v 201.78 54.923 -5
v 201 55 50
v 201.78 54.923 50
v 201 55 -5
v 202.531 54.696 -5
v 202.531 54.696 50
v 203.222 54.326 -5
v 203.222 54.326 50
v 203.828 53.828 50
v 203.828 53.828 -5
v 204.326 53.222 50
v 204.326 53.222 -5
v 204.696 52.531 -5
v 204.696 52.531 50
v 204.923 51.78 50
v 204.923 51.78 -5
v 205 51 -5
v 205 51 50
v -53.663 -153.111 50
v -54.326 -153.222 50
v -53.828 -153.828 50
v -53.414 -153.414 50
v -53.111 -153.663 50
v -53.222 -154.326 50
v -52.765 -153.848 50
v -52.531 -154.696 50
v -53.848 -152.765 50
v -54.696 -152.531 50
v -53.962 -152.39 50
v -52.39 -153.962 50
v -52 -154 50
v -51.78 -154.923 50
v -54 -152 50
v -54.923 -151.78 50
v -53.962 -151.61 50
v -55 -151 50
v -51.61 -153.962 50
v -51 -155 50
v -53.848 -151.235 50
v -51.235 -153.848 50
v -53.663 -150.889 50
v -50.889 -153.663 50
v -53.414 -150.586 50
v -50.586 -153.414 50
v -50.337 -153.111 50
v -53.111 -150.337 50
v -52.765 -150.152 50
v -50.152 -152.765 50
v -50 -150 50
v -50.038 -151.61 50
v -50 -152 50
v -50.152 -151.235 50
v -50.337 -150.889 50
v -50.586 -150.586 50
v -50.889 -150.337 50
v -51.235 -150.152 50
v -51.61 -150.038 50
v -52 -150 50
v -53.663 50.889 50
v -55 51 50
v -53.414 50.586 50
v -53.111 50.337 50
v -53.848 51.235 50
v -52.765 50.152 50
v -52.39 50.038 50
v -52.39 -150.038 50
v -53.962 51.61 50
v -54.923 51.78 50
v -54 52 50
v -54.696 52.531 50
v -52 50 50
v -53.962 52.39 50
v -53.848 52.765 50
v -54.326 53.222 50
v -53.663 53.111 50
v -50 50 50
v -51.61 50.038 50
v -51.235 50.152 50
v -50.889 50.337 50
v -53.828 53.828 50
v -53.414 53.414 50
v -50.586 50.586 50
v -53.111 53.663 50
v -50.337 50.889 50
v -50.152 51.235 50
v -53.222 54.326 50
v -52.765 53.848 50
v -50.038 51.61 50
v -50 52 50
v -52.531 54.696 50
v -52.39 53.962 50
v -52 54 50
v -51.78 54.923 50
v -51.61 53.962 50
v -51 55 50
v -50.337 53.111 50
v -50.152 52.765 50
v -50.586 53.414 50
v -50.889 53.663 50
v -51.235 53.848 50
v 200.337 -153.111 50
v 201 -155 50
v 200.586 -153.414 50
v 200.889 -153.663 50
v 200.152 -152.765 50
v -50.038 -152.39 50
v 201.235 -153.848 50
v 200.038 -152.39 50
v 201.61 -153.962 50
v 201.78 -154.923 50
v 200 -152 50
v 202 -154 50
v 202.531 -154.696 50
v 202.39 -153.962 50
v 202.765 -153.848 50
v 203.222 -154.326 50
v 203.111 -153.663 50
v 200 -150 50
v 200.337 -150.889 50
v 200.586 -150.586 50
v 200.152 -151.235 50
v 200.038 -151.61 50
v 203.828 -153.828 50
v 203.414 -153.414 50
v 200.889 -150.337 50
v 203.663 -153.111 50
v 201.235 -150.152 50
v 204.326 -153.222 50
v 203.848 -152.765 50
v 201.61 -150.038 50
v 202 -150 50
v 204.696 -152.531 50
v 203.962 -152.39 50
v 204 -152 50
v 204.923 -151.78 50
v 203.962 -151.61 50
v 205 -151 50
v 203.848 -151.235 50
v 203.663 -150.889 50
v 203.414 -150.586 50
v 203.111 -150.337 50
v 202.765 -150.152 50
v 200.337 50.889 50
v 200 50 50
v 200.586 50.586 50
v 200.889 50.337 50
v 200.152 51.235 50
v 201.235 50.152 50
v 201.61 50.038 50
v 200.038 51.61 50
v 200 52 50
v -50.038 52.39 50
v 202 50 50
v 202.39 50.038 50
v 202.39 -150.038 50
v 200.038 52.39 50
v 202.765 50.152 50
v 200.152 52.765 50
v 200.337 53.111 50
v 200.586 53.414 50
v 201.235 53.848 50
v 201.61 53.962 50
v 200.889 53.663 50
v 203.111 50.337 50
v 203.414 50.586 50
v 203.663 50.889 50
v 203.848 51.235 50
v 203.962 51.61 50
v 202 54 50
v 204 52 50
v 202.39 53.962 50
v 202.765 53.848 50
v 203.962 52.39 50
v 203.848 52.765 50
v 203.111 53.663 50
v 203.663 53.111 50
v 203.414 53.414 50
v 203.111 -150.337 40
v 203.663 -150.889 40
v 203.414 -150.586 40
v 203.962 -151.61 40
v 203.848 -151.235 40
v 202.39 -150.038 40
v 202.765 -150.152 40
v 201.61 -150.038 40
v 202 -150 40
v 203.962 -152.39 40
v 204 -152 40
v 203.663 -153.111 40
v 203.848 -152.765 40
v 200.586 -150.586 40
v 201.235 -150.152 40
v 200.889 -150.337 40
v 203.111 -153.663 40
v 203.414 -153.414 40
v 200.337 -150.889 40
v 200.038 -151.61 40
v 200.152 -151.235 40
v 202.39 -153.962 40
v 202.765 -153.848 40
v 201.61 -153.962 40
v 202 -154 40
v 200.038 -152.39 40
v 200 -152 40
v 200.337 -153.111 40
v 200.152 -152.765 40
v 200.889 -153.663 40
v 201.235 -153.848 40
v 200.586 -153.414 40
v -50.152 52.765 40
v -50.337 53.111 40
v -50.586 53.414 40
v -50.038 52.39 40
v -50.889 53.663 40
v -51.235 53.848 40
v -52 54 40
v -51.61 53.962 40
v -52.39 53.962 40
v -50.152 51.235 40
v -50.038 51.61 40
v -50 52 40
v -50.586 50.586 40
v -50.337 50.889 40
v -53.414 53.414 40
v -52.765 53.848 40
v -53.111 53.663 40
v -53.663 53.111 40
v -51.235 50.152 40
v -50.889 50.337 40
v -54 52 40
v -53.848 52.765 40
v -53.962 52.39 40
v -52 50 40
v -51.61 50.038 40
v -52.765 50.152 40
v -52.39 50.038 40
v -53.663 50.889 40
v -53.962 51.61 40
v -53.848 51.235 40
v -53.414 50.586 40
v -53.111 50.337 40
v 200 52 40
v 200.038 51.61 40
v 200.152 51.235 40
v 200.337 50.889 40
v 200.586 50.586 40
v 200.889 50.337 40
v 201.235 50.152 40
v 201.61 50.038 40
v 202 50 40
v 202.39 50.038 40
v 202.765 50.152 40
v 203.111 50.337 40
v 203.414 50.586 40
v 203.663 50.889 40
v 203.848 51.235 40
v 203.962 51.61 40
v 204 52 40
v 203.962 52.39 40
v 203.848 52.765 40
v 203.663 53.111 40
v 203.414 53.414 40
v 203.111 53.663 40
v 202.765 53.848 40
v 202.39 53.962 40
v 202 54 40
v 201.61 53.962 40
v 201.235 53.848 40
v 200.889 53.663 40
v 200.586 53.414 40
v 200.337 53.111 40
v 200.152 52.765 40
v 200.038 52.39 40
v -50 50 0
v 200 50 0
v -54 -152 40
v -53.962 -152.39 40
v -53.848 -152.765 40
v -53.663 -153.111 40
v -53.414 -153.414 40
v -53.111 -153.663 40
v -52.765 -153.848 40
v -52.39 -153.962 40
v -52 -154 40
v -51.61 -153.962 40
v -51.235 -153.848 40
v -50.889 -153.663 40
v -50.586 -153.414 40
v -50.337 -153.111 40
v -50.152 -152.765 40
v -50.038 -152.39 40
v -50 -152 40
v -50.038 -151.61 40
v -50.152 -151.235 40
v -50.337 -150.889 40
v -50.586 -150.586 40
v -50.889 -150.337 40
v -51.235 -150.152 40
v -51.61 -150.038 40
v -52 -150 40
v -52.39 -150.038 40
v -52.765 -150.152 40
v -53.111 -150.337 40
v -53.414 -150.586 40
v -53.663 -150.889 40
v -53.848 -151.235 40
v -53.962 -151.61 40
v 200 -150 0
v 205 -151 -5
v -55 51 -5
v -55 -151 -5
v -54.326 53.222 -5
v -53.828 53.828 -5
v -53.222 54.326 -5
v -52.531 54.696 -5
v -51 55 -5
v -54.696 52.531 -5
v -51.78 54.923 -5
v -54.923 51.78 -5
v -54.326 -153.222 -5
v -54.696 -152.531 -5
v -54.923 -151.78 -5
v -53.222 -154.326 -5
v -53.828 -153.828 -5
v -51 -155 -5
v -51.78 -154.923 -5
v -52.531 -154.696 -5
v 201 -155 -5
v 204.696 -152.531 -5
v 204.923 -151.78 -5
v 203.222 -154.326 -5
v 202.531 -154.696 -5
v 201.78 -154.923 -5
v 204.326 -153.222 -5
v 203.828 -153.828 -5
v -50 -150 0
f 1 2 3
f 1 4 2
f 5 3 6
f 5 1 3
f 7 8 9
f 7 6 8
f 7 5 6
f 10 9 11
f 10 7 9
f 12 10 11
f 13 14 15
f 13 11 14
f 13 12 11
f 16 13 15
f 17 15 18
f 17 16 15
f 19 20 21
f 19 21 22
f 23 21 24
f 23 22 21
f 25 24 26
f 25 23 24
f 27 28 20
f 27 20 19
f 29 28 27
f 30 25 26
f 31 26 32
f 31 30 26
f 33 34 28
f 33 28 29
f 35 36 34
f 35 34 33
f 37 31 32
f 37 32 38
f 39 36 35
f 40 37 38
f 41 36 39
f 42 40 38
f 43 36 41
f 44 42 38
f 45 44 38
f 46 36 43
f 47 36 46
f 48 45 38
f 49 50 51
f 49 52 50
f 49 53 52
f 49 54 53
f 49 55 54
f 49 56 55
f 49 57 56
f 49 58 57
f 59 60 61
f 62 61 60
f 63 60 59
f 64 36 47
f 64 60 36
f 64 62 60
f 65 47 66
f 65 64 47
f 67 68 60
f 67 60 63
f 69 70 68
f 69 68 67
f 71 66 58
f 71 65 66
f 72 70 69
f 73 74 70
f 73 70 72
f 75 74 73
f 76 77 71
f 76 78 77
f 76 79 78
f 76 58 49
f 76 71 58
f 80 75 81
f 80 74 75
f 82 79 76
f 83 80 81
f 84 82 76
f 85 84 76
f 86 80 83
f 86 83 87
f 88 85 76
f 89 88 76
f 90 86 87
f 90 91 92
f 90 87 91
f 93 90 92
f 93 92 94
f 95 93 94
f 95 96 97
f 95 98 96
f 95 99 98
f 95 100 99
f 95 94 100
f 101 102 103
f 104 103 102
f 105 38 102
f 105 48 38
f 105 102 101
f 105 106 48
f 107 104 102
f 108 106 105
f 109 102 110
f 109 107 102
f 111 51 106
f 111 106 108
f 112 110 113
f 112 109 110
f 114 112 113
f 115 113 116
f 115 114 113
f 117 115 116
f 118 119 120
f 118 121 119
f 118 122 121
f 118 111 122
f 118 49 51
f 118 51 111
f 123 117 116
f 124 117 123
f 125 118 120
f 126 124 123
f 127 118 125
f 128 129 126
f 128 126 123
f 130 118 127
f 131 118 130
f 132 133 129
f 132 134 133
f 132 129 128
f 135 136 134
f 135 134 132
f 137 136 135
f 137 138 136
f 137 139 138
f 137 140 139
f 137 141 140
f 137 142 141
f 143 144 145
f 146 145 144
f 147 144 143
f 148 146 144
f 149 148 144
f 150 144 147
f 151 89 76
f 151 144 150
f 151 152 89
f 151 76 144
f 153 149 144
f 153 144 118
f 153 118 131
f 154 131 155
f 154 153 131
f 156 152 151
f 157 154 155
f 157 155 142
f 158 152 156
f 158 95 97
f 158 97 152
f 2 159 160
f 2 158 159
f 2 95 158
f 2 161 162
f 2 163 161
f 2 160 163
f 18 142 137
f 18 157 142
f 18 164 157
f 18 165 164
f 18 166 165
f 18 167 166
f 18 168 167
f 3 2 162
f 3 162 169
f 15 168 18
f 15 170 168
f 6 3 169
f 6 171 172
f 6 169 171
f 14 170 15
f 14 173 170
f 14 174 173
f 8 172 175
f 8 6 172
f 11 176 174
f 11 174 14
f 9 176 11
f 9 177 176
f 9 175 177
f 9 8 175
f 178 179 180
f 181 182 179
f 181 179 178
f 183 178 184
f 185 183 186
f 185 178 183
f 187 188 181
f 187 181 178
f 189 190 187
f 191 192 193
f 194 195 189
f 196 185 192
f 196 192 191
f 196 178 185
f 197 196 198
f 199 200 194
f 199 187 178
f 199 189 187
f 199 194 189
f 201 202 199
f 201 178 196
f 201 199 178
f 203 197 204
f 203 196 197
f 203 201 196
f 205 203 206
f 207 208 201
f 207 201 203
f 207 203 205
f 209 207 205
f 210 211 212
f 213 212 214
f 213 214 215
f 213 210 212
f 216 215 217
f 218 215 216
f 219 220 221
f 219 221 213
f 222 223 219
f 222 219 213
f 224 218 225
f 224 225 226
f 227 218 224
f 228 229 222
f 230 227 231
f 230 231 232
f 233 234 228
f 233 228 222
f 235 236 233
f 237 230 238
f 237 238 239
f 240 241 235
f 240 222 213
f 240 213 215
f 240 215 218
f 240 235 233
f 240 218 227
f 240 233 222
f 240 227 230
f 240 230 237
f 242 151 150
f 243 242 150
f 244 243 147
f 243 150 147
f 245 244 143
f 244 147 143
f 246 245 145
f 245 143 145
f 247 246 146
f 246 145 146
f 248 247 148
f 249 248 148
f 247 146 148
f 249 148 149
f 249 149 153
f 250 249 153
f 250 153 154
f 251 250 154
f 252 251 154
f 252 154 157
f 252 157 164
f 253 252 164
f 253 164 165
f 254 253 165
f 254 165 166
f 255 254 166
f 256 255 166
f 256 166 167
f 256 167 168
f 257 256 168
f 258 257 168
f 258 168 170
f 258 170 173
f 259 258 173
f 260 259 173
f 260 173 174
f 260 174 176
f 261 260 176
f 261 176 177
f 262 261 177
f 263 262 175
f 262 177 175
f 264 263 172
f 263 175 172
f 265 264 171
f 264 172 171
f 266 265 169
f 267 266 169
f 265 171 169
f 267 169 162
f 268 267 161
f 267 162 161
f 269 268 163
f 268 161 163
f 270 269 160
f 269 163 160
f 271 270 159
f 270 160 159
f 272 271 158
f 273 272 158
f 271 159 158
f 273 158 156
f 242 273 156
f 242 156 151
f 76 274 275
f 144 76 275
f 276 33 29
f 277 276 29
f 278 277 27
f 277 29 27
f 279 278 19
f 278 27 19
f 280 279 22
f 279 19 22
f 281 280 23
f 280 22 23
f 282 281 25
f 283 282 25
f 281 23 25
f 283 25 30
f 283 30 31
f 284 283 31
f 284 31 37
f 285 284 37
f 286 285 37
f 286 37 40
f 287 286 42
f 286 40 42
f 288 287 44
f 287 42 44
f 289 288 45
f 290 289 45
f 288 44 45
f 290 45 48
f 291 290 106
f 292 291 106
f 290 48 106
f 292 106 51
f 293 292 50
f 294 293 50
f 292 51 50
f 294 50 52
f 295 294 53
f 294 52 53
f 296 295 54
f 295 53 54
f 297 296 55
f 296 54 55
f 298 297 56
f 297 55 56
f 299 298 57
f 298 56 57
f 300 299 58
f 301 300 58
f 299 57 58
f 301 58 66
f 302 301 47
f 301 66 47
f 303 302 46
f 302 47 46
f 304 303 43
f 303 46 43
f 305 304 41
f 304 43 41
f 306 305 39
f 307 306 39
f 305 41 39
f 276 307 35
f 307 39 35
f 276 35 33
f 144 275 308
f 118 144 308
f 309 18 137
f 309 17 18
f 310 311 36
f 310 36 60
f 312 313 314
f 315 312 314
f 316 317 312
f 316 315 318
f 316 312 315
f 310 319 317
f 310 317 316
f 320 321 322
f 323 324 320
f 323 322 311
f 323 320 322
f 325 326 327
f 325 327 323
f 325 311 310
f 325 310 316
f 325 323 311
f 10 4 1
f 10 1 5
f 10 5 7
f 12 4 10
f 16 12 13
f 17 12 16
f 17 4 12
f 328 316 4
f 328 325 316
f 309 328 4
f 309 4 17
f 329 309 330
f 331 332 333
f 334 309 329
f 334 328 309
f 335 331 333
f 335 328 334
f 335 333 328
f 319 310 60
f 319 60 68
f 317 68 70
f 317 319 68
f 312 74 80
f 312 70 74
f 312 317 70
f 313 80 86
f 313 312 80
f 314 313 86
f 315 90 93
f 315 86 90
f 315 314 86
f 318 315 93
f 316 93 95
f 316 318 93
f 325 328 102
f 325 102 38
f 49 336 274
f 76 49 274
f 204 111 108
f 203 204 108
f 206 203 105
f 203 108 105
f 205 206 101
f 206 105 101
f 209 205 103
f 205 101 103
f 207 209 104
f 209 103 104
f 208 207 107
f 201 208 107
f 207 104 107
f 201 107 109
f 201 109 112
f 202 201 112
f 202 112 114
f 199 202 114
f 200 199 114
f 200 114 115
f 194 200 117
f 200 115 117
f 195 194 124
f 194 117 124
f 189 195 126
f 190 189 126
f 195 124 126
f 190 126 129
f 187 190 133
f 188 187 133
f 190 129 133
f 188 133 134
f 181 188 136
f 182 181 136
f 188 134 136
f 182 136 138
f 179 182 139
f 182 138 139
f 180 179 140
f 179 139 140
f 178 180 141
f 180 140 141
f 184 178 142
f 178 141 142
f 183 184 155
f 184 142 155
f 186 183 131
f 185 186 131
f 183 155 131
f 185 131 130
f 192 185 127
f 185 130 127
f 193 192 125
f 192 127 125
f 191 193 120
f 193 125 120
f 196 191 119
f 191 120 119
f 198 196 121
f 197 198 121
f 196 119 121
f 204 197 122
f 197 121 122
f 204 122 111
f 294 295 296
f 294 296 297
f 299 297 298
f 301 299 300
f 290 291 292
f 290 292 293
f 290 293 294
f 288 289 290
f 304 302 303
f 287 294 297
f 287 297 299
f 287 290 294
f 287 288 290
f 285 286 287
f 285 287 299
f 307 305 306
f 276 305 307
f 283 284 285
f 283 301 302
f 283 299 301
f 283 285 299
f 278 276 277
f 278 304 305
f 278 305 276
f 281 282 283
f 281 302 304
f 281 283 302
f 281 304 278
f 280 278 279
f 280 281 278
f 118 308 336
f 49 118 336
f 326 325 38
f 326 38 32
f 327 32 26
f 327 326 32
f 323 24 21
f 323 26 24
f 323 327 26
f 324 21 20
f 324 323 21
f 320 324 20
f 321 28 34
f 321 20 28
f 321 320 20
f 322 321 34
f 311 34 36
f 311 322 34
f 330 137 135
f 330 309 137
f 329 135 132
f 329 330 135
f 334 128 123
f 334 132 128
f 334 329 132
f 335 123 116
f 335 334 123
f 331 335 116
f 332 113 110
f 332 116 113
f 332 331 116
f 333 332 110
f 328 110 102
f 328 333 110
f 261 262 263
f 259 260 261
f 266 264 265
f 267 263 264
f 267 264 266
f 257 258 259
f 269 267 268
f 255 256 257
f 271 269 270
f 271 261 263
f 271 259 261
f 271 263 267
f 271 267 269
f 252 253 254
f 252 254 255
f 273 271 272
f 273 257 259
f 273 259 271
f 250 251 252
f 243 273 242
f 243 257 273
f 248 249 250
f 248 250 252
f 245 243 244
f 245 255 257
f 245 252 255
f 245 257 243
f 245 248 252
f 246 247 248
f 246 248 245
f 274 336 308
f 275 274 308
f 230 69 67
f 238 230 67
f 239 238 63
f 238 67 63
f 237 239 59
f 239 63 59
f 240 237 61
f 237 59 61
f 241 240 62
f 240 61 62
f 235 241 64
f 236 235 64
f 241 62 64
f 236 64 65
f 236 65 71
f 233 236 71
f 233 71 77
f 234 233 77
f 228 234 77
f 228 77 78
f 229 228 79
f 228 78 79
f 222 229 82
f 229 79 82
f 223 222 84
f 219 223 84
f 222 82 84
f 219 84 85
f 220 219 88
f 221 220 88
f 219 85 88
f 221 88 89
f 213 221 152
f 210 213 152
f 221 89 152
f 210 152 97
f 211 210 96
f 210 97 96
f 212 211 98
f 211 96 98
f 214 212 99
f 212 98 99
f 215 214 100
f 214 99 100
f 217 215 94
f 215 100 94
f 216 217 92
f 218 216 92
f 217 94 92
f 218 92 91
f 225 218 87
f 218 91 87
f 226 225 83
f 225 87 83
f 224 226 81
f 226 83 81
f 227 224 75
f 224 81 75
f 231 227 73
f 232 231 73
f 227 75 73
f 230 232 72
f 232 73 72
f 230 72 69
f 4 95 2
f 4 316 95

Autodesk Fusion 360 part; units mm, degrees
sketch "Sketch1" plane through (0, 0, 0) normal (0, 0, 1) x (1, 0, 0)
  line L0 (-50, 50) -> (200, 50)
  line L1 (200, 50) -> (200, -150)
  line L2 (200, -150) -> (-50, -150)
  line L3 (-50, -150) -> (-50, 50)
  line L4 (-55, 25) -> (-55, 51)
  line L5 (-55, 55) -> (-25, 55)
  line L6 (-51, 55) -> (201, 55)
  line L7 (205, 51) -> (205, -151)
  line L8 (201, -155) -> (-51, -155)
  line L9 (-55, -151) -> (-55, 55)
  arc A0 (-51, 55) -> (-55, 51) centre (-51, 51) ccw
  arc A1 (205, 51) -> (201, 55) centre (201, 51) ccw
  arc A2 (201, -155) -> (205, -151) centre (201, -151) ccw
  arc A3 (-55, -151) -> (-51, -155) centre (-51, -151) ccw
  point P0 (205, 55)
  point P1 (-55, -155)
  dimension "d1" = 250
  dimension "d2" = 200
  dimension "d3" = 260
  dimension "d4" = 210
  dimension "d5" = 4
  dimension "d6" = 4
  dimension "d7" = 4
  dimension "d8" = 4
extrude "Extrude1" add sketch "Sketch1" along normal blind 50 contours L4 L5 L6 L7 L8 L9 A0 A1 A2 A3
sketch "Sketch2" plane through (0, 0, 0) normal (0, 0, -1) x (1, 0, 0)
  line L0 (-50, 150) -> (200, 150)
  line L1 (200, 150) -> (200, -50)
  line L2 (200, -50) -> (-50, -50)
  line L3 (-50, -50) -> (-50, 150)
  line L4 (-55, 151) -> (-55, -51)
  arc A0 (-55, -51) -> (-51, -55) centre (-51, -51) ccw
  line L5 (-51, -55) -> (201, -55)
  arc A1 (201, -55) -> (205, -51) centre (201, -51) ccw
  line L6 (205, -51) -> (205, 151)
  arc A2 (205, 151) -> (201, 155) centre (201, 151) ccw
  line L7 (201, 155) -> (-51, 155)
  arc A3 (-51, 155) -> (-55, 151) centre (-51, 151) ccw
sketch "Sketch3" plane through (0, 0, 0) normal (0, 0, -1) x (1, 0, 0)
  line L0 (-51, 155) -> (201, 155)
  line L1 (205, 151) -> (205, -51)
  line L2 (201, -55) -> (-51, -55)
  line L3 (-55, -51) -> (-55, 151)
  arc A0 (201, -55) -> (205, -51) centre (201, -51) ccw
  arc A1 (205, 151) -> (201, 155) centre (201, 151) ccw
  arc A2 (-51, 155) -> (-55, 151) centre (-51, 151) ccw
  arc A3 (-55, -51) -> (-51, -55) centre (-51, -51) ccw
  dimension "d11" = 4
  dimension "d12" = 4
  dimension "d13" = 4
  dimension "d14" = 4
extrude "Extrude2" add sketch "Sketch3" along normal blind 5
sketch "Sketch4" plane through (0, 0, 50) normal (0, 0, 1) x (-1, 0, 0)
  line L0 (-200, 150) -> (50, 150)
  line L1 (50, 150) -> (50, -50)
  line L2 (50, -50) -> (-200, -50)
  line L3 (-200, -50) -> (-200, 150)
  line L4 (55, -51) -> (55, 151)
  arc A0 (55, 151) -> (51, 155) centre (51, 151) ccw
  line L5 (51, 155) -> (-201, 155)
  arc A1 (-201, 155) -> (-205, 151) centre (-201, 151) ccw
  line L6 (-205, 151) -> (-205, -51)
  arc A2 (-205, -51) -> (-201, -55) centre (-201, -51) ccw
  line L7 (-201, -55) -> (51, -55)
  arc A3 (51, -55) -> (55, -51) centre (51, -51) ccw
  circle A4 centre (52, -52) radius 2
  circle A5 centre (-202, -52) radius 2
  circle A6 centre (-202, 152) radius 2
  circle A7 centre (52, 152) radius 2
  dimension "d17" = 4
  dimension "d18" = 4
  dimension "d19" = 4
extrude "Extrude3" cut sketch "Sketch4" against normal blind 10 contours A4 | A5 | A6 | A7
thread "Thread1" "ISO Metric profile 4.0 M4x0.7 M4x0.7 6H" major diameter 4.1095 minor diameter 3.332 pitch 0.7 angle 60 resizes the face on face at (200.0618, -152.4935, 43.3333)
thread "Thread2" "ISO Metric profile 4.0 M4x0.7 M4x0.7 6H" major diameter 4.1095 minor diameter 3.332 pitch 0.7 angle 60 resizes the face on face at (-52.5417, 50.0748, 43.3333) on face at (200.9149, 50.3199, 43.3333) on face at (-50.0618, -152.4935, 43.3333)
